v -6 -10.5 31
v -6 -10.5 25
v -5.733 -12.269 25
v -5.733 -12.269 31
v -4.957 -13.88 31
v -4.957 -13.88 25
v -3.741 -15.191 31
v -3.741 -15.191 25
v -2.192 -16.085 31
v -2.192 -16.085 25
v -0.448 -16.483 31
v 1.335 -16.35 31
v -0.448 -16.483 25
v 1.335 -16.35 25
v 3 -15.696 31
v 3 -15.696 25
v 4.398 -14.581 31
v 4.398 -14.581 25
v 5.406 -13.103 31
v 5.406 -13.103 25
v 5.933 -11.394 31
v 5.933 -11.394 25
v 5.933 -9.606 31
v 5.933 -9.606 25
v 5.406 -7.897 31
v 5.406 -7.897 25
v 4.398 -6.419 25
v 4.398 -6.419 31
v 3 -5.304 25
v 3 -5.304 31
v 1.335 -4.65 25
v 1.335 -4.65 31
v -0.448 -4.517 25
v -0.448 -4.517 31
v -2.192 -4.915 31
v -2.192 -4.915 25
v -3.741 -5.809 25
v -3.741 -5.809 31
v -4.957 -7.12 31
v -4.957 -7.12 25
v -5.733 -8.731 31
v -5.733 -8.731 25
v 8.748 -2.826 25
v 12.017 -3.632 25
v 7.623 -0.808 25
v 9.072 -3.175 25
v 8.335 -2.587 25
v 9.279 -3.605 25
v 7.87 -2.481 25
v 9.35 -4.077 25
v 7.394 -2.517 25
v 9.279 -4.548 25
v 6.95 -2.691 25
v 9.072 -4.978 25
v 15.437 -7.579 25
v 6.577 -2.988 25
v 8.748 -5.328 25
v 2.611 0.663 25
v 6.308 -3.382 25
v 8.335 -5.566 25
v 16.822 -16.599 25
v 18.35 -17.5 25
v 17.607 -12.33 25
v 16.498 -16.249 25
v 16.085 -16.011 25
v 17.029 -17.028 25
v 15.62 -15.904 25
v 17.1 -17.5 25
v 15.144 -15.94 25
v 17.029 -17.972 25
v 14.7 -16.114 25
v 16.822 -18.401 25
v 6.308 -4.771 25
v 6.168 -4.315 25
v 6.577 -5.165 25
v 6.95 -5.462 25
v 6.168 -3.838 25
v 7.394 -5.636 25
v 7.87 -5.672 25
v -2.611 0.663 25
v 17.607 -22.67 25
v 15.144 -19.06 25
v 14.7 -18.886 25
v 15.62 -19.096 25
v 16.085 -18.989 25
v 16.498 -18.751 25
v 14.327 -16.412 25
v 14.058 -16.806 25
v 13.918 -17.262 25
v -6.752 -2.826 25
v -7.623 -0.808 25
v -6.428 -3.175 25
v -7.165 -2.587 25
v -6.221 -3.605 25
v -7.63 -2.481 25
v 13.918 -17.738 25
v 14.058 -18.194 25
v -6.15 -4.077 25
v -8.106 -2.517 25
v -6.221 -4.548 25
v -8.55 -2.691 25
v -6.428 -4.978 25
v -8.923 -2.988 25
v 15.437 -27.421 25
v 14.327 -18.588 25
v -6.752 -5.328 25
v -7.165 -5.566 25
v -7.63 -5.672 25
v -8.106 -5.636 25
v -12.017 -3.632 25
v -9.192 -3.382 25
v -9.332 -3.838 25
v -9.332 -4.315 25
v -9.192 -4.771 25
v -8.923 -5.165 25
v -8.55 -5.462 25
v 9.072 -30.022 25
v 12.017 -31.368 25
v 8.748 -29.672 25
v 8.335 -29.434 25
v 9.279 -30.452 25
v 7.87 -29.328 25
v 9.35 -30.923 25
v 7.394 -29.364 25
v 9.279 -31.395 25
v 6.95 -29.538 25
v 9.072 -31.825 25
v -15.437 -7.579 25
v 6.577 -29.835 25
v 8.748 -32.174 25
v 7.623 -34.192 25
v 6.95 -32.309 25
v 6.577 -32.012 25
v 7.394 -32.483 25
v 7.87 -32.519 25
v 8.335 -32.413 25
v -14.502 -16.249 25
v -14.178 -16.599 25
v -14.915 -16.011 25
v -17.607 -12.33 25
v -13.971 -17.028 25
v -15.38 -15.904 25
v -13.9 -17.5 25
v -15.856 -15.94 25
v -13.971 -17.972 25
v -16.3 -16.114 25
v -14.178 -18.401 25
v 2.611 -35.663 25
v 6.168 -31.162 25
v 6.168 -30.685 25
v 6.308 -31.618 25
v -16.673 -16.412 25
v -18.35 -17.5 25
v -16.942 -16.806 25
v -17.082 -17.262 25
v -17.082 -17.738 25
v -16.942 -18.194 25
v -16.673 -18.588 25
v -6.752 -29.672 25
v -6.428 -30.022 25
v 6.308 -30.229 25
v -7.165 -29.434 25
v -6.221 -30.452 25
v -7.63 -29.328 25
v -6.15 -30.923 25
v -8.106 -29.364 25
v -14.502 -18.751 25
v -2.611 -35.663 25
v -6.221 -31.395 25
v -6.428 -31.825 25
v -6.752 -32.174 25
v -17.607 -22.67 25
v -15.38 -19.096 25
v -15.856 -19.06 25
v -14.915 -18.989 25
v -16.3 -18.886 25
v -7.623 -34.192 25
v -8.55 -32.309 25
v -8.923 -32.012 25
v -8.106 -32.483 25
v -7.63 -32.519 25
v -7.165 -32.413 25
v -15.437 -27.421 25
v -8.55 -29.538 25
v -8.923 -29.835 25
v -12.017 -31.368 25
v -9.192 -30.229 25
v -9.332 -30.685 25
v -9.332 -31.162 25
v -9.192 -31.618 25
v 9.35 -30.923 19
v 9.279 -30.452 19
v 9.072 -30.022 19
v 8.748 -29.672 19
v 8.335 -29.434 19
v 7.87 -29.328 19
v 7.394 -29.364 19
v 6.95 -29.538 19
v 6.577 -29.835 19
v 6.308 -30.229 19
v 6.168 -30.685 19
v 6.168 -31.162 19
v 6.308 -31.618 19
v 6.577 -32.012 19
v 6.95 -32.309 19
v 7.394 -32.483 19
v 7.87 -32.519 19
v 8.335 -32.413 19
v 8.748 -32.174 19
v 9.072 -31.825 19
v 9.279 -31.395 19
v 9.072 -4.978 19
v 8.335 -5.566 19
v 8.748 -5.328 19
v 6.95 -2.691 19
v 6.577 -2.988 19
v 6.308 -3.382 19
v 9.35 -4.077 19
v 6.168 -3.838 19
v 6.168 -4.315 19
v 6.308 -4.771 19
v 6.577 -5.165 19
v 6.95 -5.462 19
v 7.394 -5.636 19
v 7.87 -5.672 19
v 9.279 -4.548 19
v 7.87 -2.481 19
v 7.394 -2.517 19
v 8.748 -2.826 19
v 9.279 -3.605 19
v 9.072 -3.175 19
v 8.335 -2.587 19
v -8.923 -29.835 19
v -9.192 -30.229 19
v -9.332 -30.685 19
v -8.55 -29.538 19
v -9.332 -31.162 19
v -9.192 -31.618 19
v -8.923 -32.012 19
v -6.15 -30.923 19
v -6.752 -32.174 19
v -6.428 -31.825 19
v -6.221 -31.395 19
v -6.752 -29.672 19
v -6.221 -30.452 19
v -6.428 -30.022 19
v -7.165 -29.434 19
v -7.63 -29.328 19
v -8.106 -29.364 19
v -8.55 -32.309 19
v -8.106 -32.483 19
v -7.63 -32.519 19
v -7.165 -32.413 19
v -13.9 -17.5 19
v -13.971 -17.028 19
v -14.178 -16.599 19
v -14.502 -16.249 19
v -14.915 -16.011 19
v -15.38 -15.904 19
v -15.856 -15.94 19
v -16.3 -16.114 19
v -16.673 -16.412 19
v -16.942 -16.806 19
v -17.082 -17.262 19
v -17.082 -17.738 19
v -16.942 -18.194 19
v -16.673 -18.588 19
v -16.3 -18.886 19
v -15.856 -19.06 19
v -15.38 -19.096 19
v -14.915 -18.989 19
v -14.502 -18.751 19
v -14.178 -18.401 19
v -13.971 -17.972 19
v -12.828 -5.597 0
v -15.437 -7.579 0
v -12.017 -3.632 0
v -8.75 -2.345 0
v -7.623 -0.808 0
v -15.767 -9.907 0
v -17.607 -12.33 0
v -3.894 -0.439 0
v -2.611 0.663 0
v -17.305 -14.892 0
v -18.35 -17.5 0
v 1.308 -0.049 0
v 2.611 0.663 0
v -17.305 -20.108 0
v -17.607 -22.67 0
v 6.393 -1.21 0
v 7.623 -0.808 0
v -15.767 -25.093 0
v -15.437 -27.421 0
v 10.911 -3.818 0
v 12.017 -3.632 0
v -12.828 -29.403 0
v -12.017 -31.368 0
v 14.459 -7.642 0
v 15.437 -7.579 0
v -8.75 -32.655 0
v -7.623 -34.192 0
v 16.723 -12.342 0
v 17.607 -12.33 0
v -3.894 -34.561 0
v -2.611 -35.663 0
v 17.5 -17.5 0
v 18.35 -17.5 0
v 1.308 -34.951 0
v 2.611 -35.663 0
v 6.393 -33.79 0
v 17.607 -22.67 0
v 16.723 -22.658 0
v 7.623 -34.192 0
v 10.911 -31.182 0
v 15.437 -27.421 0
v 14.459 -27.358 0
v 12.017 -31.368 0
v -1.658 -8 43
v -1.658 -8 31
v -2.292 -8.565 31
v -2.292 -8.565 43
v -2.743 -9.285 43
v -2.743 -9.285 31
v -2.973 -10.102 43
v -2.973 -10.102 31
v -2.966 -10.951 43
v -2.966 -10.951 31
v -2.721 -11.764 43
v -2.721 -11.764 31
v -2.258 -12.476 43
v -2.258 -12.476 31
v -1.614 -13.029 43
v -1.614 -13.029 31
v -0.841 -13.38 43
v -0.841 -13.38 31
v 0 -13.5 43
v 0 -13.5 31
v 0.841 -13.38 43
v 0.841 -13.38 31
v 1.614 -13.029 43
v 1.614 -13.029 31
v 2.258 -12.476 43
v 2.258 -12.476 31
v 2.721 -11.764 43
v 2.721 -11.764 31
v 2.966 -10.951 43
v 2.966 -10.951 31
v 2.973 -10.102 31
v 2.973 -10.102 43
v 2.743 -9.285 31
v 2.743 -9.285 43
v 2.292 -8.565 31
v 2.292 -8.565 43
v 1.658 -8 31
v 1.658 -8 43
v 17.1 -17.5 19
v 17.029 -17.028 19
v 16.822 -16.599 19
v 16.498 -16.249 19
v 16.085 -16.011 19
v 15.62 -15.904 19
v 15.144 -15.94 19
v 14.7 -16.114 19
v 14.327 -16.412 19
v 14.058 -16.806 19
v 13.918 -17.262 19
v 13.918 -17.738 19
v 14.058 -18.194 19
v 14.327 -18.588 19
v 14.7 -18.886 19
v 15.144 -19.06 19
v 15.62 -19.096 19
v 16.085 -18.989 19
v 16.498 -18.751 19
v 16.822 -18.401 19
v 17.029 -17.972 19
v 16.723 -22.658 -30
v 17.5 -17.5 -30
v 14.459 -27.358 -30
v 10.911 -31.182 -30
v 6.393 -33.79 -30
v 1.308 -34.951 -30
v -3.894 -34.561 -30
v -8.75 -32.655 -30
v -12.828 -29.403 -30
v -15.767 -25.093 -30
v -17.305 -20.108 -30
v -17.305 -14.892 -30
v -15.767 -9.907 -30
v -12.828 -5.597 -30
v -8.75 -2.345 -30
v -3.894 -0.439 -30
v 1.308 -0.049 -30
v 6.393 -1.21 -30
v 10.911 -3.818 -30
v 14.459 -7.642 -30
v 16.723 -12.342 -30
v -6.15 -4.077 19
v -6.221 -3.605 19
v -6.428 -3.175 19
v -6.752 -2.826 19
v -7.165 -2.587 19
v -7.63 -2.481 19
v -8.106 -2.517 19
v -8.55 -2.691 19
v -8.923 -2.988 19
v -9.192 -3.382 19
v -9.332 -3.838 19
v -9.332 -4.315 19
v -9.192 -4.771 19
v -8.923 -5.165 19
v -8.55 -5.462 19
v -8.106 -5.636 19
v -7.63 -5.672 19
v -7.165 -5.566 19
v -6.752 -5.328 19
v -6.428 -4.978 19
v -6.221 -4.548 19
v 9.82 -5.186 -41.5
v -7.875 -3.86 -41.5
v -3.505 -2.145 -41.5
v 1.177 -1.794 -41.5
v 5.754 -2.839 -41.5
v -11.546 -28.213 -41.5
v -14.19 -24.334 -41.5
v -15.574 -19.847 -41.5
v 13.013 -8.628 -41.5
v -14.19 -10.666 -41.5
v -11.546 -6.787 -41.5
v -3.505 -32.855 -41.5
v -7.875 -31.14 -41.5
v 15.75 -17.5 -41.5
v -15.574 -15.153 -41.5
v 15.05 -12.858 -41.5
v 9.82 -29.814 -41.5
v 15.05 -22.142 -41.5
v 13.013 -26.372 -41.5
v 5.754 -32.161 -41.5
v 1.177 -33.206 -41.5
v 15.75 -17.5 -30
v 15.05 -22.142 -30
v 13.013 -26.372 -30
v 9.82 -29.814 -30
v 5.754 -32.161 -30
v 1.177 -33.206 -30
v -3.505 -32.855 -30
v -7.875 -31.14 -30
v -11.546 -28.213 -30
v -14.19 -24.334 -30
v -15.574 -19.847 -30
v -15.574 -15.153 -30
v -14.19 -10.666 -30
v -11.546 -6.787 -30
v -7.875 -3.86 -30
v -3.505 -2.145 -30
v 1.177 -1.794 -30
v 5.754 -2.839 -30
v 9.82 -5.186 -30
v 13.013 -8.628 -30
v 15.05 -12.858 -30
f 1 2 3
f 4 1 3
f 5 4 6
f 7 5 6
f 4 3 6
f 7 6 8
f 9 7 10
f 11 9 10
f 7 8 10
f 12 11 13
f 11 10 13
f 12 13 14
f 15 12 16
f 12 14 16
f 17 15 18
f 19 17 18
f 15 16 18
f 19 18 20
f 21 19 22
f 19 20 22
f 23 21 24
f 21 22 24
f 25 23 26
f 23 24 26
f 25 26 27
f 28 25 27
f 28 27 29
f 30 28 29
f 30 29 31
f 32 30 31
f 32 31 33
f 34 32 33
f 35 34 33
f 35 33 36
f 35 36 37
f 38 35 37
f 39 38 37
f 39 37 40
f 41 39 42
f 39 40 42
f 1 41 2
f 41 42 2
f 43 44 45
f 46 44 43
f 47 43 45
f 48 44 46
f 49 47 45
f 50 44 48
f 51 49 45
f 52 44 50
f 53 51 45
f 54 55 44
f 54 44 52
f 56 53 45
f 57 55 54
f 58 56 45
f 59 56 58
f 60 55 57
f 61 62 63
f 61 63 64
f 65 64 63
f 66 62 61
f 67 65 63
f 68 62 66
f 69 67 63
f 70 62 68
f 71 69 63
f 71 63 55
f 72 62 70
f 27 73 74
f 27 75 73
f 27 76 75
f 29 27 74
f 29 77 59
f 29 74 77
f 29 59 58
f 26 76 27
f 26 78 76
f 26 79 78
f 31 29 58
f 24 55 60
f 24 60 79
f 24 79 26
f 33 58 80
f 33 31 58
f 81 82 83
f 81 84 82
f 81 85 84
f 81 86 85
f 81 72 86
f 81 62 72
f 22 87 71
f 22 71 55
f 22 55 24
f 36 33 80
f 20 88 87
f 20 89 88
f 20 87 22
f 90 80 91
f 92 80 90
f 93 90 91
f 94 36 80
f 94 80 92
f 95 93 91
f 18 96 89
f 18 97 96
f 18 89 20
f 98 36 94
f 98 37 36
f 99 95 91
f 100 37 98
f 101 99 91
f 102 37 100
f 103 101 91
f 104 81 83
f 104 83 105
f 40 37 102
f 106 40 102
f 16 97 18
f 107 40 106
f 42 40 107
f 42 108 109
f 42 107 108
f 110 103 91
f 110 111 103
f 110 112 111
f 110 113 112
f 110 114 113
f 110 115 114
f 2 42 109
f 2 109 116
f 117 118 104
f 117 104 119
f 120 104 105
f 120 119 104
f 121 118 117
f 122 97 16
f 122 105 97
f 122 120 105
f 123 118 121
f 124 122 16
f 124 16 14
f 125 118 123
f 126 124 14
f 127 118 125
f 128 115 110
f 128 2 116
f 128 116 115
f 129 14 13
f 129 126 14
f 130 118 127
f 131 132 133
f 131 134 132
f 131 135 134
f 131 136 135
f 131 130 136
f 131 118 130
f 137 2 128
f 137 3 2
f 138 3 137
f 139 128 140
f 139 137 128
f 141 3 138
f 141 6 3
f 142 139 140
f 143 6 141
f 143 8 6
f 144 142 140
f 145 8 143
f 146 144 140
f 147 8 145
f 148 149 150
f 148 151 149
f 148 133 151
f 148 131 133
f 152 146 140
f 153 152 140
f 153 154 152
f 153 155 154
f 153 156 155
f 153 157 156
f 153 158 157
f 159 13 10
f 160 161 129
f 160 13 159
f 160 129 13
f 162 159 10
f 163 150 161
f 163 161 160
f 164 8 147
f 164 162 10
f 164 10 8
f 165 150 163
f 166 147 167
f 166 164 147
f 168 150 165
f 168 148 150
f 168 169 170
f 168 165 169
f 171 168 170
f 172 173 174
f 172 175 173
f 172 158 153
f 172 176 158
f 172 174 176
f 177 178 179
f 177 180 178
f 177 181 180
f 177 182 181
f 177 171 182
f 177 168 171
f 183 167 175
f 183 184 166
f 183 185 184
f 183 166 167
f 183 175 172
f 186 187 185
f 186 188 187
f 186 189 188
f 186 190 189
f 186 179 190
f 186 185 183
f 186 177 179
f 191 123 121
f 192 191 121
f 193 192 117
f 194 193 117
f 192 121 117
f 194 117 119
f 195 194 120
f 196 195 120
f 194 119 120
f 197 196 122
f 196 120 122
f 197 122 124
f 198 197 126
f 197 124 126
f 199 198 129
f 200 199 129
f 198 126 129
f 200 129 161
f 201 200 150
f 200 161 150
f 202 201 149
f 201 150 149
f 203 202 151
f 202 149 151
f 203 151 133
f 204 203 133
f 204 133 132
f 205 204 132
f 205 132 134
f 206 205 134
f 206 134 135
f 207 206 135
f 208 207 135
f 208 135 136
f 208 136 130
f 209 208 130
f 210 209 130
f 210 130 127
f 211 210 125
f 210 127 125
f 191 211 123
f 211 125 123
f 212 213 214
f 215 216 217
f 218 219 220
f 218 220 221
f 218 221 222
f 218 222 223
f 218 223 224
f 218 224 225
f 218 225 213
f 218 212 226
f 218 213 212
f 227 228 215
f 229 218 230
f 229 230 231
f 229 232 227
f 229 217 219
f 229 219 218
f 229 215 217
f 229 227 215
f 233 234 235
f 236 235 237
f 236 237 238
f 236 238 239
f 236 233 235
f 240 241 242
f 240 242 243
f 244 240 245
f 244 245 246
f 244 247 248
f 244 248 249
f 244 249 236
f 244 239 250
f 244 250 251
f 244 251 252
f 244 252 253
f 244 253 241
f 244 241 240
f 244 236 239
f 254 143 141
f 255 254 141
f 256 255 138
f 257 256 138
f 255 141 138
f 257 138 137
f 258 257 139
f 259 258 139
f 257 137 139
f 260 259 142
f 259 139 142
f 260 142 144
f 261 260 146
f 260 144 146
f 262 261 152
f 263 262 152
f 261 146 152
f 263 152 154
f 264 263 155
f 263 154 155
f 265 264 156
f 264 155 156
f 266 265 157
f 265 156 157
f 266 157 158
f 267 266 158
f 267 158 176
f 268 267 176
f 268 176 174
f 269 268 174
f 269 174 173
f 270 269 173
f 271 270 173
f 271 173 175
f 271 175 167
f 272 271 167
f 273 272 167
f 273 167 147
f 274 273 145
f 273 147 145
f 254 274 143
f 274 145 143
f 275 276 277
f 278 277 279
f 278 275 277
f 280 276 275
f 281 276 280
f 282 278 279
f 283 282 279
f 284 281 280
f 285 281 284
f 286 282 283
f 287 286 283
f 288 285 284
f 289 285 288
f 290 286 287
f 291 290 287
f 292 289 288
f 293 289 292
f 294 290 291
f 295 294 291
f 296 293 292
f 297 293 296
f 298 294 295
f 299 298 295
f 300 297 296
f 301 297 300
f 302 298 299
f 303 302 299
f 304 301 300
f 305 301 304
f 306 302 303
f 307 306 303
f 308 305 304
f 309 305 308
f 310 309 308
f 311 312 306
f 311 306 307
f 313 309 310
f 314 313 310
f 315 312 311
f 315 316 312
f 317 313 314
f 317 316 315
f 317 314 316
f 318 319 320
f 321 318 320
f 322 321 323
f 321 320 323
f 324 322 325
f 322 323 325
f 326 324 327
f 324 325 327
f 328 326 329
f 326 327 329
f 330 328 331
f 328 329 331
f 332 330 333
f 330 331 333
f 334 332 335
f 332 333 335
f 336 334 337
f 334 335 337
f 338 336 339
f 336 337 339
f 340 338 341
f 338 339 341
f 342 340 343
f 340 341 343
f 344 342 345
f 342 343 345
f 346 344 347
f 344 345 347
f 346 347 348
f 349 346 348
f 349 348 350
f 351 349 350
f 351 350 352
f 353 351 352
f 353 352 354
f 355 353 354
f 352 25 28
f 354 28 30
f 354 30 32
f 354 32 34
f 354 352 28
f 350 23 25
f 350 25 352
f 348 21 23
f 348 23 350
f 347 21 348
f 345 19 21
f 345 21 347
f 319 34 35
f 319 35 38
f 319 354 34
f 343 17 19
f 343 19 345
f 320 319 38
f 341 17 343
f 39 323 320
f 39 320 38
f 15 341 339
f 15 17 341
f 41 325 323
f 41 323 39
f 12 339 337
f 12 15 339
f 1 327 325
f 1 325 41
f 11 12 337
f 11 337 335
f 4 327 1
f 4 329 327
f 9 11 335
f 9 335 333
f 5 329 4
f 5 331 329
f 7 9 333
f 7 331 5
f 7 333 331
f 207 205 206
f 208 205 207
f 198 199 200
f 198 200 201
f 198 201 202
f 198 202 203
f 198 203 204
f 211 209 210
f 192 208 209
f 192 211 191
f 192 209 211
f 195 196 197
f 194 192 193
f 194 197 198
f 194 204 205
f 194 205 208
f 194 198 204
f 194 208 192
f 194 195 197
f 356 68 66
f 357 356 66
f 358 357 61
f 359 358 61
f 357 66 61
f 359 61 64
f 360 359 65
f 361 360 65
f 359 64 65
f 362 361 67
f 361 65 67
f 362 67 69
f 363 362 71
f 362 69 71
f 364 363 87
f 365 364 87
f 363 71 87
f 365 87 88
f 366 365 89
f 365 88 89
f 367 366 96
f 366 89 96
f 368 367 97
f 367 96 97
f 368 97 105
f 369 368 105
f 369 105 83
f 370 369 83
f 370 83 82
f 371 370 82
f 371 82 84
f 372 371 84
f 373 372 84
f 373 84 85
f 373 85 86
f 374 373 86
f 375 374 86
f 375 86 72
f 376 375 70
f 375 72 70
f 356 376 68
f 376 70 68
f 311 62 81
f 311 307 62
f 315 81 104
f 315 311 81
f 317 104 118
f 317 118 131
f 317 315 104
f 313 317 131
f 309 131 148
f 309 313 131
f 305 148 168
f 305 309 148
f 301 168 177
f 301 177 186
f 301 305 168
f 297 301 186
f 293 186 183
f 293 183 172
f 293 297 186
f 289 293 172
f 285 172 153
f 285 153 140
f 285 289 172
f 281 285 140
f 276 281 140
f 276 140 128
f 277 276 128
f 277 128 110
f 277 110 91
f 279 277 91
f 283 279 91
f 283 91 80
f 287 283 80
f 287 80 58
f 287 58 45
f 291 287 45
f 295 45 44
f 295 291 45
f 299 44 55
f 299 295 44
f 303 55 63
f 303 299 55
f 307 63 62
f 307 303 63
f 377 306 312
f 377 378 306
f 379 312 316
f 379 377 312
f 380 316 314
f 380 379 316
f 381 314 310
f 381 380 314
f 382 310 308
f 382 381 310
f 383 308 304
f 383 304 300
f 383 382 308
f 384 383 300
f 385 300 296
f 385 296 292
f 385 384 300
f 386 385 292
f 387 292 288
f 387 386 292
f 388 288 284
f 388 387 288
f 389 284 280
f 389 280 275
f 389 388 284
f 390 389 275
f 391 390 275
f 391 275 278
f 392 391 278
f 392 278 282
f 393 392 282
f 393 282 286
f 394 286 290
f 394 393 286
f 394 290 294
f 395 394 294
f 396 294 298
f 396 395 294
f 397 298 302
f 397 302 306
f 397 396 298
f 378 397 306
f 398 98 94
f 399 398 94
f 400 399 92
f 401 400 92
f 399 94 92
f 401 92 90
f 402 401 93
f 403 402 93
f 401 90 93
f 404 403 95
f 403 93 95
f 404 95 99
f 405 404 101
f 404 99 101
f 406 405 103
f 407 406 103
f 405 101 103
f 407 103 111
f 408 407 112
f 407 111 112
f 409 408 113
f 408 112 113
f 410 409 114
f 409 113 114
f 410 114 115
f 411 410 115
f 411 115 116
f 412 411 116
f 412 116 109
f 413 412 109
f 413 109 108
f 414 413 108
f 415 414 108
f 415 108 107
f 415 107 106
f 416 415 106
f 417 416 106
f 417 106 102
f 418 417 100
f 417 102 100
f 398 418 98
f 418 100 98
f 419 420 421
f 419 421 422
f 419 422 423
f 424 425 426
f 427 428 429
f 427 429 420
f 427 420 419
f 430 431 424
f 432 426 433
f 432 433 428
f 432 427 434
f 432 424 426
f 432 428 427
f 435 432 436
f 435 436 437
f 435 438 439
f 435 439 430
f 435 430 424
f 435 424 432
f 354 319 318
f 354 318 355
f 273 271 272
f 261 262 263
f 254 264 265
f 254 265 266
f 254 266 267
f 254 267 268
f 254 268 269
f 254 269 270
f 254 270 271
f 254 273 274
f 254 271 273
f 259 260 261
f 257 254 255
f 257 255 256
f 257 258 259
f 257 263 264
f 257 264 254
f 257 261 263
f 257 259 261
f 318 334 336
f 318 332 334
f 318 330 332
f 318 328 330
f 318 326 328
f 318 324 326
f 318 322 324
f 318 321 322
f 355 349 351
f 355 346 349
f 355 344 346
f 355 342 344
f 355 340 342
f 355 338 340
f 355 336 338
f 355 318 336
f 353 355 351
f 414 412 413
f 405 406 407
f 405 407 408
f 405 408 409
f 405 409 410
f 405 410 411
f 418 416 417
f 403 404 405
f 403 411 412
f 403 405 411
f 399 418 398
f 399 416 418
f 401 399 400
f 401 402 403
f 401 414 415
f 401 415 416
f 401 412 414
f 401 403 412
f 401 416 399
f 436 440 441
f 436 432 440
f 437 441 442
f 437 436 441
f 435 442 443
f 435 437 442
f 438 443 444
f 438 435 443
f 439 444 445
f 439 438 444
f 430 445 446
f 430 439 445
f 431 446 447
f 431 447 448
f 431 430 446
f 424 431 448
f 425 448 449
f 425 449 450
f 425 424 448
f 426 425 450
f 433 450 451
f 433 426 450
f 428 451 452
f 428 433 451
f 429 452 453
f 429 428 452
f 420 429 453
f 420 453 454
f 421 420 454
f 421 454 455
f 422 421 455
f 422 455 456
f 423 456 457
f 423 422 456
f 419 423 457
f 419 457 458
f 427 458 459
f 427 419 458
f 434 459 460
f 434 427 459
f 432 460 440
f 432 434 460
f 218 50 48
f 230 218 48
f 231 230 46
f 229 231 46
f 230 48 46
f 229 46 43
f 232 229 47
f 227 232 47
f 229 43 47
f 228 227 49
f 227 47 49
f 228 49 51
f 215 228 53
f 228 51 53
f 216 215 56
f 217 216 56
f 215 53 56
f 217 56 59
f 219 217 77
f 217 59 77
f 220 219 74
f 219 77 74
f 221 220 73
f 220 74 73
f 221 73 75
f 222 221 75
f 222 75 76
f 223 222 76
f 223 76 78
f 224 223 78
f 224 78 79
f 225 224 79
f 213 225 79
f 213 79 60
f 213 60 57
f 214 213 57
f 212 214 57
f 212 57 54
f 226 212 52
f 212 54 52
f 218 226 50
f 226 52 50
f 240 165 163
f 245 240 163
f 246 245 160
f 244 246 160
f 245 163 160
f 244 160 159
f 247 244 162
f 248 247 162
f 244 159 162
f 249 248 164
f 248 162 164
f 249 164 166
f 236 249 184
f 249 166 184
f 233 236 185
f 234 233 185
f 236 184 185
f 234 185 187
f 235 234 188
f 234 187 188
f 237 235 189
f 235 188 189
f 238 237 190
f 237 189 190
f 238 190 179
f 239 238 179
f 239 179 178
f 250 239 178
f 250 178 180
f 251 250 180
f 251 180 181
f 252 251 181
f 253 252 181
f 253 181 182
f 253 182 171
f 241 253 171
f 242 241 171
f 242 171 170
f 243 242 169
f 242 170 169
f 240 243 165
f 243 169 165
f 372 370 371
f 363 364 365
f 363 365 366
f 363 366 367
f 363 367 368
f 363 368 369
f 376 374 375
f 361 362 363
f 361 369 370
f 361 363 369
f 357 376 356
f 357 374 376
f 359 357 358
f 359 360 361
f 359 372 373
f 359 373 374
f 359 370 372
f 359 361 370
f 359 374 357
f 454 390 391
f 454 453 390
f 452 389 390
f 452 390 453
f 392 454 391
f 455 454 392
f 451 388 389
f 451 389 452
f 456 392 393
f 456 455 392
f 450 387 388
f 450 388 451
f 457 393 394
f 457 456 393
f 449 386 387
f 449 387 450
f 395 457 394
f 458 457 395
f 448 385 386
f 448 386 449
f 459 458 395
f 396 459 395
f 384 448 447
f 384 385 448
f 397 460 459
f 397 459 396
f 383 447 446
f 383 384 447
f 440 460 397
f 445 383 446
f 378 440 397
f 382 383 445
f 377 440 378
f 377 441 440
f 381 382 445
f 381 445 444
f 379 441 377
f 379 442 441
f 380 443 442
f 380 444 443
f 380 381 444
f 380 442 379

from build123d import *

# Parameters (mm, degrees)
SKETCH1_W               = 11.5
SKETCH1_H               = 15.75
SKETCH2_R               = 6
BOSS_EXTRUDE1_DEPTH     = 6
SKETCH3_R               = 3
BOSS_EXTRUDE2_DEPTH     = 12
SKETCH4_R               = 1.6
CUT_EXTRUDE1_DEPTH      = 6
CUT_EXTRUDE2_DEPTH      = 94.60659699
CUT_EXTRUDE2_DEPTH_BACK = 12


with BuildPart() as part:
    # Sketch1 → Revolve1 (revolve)
    with BuildSketch(Plane(origin=(0, 0, 0), x_dir=(0, 0, -1), z_dir=(1, 0, 0)), mode=Mode.PRIVATE) as revolve1_sk:
        with Locations((35.75, -25.375)):
            Rectangle(SKETCH1_W, SKETCH1_H)
        Polygon((30, -17.5), (0, -17.5), (0, -35), (30, -35), (30, -33.25), align=None)
        Polygon((0, -17.5), (-25, -17.5), (-25, -35.85), (0, -35.85), (0, -35), align=None)
    revolve(revolve1_sk.sketch.rotate(Axis((0, -17.5, 25), (0, 0, -1)), 270), axis=Axis((0, -17.5, 25), (0, 0, -1)))

    # Sketch2 → Boss-Extrude1 (add)
    with BuildSketch(Plane.XY.offset(25)):
        with Locations(Location((0, -10.5, 0), (0, 0, 180))):
            Circle(SKETCH2_R)
    extrude(amount=BOSS_EXTRUDE1_DEPTH)

    # Sketch3 → Boss-Extrude2 (add)
    with BuildSketch(Plane.XY.offset(31)):
        with Locations((0, -10.5)):
            Circle(SKETCH3_R)
    extrude(amount=BOSS_EXTRUDE2_DEPTH)

    # Sketch4 → Cut-Extrude1 (cut)
    with BuildSketch(Plane.XY.offset(25)):
        with Locations((-15.5, -17.5)):
            Circle(SKETCH4_R)
        with Locations((15.5, -17.5)):
            Circle(SKETCH4_R)
        with Locations((-7.75, -4.076606241)):
            Circle(SKETCH4_R)
        with Locations((7.75, -4.076606241)):
            Circle(SKETCH4_R)
        with Locations((7.75, -30.923393759)):
            Circle(SKETCH4_R)
        with Locations((-7.75, -30.923393759)):
            Circle(SKETCH4_R)
    extrude(amount=-CUT_EXTRUDE1_DEPTH, mode=Mode.SUBTRACT)

    # Sketch5 → Cut-Extrude2 (cut, two sides: drawn at the far end of the back side and taken through both)
    with BuildSketch(Plane.XY.offset(43).offset(-CUT_EXTRUDE2_DEPTH_BACK)):
        with BuildLine():
            Line((-1.658312395, -8), (1.658312395, -8))
            ThreePointArc((1.658312395, -8), (0, -7.5), (-1.658312395, -8))
        make_face()
    extrude(amount=CUT_EXTRUDE2_DEPTH + CUT_EXTRUDE2_DEPTH_BACK, mode=Mode.SUBTRACT)


solid = part.part
